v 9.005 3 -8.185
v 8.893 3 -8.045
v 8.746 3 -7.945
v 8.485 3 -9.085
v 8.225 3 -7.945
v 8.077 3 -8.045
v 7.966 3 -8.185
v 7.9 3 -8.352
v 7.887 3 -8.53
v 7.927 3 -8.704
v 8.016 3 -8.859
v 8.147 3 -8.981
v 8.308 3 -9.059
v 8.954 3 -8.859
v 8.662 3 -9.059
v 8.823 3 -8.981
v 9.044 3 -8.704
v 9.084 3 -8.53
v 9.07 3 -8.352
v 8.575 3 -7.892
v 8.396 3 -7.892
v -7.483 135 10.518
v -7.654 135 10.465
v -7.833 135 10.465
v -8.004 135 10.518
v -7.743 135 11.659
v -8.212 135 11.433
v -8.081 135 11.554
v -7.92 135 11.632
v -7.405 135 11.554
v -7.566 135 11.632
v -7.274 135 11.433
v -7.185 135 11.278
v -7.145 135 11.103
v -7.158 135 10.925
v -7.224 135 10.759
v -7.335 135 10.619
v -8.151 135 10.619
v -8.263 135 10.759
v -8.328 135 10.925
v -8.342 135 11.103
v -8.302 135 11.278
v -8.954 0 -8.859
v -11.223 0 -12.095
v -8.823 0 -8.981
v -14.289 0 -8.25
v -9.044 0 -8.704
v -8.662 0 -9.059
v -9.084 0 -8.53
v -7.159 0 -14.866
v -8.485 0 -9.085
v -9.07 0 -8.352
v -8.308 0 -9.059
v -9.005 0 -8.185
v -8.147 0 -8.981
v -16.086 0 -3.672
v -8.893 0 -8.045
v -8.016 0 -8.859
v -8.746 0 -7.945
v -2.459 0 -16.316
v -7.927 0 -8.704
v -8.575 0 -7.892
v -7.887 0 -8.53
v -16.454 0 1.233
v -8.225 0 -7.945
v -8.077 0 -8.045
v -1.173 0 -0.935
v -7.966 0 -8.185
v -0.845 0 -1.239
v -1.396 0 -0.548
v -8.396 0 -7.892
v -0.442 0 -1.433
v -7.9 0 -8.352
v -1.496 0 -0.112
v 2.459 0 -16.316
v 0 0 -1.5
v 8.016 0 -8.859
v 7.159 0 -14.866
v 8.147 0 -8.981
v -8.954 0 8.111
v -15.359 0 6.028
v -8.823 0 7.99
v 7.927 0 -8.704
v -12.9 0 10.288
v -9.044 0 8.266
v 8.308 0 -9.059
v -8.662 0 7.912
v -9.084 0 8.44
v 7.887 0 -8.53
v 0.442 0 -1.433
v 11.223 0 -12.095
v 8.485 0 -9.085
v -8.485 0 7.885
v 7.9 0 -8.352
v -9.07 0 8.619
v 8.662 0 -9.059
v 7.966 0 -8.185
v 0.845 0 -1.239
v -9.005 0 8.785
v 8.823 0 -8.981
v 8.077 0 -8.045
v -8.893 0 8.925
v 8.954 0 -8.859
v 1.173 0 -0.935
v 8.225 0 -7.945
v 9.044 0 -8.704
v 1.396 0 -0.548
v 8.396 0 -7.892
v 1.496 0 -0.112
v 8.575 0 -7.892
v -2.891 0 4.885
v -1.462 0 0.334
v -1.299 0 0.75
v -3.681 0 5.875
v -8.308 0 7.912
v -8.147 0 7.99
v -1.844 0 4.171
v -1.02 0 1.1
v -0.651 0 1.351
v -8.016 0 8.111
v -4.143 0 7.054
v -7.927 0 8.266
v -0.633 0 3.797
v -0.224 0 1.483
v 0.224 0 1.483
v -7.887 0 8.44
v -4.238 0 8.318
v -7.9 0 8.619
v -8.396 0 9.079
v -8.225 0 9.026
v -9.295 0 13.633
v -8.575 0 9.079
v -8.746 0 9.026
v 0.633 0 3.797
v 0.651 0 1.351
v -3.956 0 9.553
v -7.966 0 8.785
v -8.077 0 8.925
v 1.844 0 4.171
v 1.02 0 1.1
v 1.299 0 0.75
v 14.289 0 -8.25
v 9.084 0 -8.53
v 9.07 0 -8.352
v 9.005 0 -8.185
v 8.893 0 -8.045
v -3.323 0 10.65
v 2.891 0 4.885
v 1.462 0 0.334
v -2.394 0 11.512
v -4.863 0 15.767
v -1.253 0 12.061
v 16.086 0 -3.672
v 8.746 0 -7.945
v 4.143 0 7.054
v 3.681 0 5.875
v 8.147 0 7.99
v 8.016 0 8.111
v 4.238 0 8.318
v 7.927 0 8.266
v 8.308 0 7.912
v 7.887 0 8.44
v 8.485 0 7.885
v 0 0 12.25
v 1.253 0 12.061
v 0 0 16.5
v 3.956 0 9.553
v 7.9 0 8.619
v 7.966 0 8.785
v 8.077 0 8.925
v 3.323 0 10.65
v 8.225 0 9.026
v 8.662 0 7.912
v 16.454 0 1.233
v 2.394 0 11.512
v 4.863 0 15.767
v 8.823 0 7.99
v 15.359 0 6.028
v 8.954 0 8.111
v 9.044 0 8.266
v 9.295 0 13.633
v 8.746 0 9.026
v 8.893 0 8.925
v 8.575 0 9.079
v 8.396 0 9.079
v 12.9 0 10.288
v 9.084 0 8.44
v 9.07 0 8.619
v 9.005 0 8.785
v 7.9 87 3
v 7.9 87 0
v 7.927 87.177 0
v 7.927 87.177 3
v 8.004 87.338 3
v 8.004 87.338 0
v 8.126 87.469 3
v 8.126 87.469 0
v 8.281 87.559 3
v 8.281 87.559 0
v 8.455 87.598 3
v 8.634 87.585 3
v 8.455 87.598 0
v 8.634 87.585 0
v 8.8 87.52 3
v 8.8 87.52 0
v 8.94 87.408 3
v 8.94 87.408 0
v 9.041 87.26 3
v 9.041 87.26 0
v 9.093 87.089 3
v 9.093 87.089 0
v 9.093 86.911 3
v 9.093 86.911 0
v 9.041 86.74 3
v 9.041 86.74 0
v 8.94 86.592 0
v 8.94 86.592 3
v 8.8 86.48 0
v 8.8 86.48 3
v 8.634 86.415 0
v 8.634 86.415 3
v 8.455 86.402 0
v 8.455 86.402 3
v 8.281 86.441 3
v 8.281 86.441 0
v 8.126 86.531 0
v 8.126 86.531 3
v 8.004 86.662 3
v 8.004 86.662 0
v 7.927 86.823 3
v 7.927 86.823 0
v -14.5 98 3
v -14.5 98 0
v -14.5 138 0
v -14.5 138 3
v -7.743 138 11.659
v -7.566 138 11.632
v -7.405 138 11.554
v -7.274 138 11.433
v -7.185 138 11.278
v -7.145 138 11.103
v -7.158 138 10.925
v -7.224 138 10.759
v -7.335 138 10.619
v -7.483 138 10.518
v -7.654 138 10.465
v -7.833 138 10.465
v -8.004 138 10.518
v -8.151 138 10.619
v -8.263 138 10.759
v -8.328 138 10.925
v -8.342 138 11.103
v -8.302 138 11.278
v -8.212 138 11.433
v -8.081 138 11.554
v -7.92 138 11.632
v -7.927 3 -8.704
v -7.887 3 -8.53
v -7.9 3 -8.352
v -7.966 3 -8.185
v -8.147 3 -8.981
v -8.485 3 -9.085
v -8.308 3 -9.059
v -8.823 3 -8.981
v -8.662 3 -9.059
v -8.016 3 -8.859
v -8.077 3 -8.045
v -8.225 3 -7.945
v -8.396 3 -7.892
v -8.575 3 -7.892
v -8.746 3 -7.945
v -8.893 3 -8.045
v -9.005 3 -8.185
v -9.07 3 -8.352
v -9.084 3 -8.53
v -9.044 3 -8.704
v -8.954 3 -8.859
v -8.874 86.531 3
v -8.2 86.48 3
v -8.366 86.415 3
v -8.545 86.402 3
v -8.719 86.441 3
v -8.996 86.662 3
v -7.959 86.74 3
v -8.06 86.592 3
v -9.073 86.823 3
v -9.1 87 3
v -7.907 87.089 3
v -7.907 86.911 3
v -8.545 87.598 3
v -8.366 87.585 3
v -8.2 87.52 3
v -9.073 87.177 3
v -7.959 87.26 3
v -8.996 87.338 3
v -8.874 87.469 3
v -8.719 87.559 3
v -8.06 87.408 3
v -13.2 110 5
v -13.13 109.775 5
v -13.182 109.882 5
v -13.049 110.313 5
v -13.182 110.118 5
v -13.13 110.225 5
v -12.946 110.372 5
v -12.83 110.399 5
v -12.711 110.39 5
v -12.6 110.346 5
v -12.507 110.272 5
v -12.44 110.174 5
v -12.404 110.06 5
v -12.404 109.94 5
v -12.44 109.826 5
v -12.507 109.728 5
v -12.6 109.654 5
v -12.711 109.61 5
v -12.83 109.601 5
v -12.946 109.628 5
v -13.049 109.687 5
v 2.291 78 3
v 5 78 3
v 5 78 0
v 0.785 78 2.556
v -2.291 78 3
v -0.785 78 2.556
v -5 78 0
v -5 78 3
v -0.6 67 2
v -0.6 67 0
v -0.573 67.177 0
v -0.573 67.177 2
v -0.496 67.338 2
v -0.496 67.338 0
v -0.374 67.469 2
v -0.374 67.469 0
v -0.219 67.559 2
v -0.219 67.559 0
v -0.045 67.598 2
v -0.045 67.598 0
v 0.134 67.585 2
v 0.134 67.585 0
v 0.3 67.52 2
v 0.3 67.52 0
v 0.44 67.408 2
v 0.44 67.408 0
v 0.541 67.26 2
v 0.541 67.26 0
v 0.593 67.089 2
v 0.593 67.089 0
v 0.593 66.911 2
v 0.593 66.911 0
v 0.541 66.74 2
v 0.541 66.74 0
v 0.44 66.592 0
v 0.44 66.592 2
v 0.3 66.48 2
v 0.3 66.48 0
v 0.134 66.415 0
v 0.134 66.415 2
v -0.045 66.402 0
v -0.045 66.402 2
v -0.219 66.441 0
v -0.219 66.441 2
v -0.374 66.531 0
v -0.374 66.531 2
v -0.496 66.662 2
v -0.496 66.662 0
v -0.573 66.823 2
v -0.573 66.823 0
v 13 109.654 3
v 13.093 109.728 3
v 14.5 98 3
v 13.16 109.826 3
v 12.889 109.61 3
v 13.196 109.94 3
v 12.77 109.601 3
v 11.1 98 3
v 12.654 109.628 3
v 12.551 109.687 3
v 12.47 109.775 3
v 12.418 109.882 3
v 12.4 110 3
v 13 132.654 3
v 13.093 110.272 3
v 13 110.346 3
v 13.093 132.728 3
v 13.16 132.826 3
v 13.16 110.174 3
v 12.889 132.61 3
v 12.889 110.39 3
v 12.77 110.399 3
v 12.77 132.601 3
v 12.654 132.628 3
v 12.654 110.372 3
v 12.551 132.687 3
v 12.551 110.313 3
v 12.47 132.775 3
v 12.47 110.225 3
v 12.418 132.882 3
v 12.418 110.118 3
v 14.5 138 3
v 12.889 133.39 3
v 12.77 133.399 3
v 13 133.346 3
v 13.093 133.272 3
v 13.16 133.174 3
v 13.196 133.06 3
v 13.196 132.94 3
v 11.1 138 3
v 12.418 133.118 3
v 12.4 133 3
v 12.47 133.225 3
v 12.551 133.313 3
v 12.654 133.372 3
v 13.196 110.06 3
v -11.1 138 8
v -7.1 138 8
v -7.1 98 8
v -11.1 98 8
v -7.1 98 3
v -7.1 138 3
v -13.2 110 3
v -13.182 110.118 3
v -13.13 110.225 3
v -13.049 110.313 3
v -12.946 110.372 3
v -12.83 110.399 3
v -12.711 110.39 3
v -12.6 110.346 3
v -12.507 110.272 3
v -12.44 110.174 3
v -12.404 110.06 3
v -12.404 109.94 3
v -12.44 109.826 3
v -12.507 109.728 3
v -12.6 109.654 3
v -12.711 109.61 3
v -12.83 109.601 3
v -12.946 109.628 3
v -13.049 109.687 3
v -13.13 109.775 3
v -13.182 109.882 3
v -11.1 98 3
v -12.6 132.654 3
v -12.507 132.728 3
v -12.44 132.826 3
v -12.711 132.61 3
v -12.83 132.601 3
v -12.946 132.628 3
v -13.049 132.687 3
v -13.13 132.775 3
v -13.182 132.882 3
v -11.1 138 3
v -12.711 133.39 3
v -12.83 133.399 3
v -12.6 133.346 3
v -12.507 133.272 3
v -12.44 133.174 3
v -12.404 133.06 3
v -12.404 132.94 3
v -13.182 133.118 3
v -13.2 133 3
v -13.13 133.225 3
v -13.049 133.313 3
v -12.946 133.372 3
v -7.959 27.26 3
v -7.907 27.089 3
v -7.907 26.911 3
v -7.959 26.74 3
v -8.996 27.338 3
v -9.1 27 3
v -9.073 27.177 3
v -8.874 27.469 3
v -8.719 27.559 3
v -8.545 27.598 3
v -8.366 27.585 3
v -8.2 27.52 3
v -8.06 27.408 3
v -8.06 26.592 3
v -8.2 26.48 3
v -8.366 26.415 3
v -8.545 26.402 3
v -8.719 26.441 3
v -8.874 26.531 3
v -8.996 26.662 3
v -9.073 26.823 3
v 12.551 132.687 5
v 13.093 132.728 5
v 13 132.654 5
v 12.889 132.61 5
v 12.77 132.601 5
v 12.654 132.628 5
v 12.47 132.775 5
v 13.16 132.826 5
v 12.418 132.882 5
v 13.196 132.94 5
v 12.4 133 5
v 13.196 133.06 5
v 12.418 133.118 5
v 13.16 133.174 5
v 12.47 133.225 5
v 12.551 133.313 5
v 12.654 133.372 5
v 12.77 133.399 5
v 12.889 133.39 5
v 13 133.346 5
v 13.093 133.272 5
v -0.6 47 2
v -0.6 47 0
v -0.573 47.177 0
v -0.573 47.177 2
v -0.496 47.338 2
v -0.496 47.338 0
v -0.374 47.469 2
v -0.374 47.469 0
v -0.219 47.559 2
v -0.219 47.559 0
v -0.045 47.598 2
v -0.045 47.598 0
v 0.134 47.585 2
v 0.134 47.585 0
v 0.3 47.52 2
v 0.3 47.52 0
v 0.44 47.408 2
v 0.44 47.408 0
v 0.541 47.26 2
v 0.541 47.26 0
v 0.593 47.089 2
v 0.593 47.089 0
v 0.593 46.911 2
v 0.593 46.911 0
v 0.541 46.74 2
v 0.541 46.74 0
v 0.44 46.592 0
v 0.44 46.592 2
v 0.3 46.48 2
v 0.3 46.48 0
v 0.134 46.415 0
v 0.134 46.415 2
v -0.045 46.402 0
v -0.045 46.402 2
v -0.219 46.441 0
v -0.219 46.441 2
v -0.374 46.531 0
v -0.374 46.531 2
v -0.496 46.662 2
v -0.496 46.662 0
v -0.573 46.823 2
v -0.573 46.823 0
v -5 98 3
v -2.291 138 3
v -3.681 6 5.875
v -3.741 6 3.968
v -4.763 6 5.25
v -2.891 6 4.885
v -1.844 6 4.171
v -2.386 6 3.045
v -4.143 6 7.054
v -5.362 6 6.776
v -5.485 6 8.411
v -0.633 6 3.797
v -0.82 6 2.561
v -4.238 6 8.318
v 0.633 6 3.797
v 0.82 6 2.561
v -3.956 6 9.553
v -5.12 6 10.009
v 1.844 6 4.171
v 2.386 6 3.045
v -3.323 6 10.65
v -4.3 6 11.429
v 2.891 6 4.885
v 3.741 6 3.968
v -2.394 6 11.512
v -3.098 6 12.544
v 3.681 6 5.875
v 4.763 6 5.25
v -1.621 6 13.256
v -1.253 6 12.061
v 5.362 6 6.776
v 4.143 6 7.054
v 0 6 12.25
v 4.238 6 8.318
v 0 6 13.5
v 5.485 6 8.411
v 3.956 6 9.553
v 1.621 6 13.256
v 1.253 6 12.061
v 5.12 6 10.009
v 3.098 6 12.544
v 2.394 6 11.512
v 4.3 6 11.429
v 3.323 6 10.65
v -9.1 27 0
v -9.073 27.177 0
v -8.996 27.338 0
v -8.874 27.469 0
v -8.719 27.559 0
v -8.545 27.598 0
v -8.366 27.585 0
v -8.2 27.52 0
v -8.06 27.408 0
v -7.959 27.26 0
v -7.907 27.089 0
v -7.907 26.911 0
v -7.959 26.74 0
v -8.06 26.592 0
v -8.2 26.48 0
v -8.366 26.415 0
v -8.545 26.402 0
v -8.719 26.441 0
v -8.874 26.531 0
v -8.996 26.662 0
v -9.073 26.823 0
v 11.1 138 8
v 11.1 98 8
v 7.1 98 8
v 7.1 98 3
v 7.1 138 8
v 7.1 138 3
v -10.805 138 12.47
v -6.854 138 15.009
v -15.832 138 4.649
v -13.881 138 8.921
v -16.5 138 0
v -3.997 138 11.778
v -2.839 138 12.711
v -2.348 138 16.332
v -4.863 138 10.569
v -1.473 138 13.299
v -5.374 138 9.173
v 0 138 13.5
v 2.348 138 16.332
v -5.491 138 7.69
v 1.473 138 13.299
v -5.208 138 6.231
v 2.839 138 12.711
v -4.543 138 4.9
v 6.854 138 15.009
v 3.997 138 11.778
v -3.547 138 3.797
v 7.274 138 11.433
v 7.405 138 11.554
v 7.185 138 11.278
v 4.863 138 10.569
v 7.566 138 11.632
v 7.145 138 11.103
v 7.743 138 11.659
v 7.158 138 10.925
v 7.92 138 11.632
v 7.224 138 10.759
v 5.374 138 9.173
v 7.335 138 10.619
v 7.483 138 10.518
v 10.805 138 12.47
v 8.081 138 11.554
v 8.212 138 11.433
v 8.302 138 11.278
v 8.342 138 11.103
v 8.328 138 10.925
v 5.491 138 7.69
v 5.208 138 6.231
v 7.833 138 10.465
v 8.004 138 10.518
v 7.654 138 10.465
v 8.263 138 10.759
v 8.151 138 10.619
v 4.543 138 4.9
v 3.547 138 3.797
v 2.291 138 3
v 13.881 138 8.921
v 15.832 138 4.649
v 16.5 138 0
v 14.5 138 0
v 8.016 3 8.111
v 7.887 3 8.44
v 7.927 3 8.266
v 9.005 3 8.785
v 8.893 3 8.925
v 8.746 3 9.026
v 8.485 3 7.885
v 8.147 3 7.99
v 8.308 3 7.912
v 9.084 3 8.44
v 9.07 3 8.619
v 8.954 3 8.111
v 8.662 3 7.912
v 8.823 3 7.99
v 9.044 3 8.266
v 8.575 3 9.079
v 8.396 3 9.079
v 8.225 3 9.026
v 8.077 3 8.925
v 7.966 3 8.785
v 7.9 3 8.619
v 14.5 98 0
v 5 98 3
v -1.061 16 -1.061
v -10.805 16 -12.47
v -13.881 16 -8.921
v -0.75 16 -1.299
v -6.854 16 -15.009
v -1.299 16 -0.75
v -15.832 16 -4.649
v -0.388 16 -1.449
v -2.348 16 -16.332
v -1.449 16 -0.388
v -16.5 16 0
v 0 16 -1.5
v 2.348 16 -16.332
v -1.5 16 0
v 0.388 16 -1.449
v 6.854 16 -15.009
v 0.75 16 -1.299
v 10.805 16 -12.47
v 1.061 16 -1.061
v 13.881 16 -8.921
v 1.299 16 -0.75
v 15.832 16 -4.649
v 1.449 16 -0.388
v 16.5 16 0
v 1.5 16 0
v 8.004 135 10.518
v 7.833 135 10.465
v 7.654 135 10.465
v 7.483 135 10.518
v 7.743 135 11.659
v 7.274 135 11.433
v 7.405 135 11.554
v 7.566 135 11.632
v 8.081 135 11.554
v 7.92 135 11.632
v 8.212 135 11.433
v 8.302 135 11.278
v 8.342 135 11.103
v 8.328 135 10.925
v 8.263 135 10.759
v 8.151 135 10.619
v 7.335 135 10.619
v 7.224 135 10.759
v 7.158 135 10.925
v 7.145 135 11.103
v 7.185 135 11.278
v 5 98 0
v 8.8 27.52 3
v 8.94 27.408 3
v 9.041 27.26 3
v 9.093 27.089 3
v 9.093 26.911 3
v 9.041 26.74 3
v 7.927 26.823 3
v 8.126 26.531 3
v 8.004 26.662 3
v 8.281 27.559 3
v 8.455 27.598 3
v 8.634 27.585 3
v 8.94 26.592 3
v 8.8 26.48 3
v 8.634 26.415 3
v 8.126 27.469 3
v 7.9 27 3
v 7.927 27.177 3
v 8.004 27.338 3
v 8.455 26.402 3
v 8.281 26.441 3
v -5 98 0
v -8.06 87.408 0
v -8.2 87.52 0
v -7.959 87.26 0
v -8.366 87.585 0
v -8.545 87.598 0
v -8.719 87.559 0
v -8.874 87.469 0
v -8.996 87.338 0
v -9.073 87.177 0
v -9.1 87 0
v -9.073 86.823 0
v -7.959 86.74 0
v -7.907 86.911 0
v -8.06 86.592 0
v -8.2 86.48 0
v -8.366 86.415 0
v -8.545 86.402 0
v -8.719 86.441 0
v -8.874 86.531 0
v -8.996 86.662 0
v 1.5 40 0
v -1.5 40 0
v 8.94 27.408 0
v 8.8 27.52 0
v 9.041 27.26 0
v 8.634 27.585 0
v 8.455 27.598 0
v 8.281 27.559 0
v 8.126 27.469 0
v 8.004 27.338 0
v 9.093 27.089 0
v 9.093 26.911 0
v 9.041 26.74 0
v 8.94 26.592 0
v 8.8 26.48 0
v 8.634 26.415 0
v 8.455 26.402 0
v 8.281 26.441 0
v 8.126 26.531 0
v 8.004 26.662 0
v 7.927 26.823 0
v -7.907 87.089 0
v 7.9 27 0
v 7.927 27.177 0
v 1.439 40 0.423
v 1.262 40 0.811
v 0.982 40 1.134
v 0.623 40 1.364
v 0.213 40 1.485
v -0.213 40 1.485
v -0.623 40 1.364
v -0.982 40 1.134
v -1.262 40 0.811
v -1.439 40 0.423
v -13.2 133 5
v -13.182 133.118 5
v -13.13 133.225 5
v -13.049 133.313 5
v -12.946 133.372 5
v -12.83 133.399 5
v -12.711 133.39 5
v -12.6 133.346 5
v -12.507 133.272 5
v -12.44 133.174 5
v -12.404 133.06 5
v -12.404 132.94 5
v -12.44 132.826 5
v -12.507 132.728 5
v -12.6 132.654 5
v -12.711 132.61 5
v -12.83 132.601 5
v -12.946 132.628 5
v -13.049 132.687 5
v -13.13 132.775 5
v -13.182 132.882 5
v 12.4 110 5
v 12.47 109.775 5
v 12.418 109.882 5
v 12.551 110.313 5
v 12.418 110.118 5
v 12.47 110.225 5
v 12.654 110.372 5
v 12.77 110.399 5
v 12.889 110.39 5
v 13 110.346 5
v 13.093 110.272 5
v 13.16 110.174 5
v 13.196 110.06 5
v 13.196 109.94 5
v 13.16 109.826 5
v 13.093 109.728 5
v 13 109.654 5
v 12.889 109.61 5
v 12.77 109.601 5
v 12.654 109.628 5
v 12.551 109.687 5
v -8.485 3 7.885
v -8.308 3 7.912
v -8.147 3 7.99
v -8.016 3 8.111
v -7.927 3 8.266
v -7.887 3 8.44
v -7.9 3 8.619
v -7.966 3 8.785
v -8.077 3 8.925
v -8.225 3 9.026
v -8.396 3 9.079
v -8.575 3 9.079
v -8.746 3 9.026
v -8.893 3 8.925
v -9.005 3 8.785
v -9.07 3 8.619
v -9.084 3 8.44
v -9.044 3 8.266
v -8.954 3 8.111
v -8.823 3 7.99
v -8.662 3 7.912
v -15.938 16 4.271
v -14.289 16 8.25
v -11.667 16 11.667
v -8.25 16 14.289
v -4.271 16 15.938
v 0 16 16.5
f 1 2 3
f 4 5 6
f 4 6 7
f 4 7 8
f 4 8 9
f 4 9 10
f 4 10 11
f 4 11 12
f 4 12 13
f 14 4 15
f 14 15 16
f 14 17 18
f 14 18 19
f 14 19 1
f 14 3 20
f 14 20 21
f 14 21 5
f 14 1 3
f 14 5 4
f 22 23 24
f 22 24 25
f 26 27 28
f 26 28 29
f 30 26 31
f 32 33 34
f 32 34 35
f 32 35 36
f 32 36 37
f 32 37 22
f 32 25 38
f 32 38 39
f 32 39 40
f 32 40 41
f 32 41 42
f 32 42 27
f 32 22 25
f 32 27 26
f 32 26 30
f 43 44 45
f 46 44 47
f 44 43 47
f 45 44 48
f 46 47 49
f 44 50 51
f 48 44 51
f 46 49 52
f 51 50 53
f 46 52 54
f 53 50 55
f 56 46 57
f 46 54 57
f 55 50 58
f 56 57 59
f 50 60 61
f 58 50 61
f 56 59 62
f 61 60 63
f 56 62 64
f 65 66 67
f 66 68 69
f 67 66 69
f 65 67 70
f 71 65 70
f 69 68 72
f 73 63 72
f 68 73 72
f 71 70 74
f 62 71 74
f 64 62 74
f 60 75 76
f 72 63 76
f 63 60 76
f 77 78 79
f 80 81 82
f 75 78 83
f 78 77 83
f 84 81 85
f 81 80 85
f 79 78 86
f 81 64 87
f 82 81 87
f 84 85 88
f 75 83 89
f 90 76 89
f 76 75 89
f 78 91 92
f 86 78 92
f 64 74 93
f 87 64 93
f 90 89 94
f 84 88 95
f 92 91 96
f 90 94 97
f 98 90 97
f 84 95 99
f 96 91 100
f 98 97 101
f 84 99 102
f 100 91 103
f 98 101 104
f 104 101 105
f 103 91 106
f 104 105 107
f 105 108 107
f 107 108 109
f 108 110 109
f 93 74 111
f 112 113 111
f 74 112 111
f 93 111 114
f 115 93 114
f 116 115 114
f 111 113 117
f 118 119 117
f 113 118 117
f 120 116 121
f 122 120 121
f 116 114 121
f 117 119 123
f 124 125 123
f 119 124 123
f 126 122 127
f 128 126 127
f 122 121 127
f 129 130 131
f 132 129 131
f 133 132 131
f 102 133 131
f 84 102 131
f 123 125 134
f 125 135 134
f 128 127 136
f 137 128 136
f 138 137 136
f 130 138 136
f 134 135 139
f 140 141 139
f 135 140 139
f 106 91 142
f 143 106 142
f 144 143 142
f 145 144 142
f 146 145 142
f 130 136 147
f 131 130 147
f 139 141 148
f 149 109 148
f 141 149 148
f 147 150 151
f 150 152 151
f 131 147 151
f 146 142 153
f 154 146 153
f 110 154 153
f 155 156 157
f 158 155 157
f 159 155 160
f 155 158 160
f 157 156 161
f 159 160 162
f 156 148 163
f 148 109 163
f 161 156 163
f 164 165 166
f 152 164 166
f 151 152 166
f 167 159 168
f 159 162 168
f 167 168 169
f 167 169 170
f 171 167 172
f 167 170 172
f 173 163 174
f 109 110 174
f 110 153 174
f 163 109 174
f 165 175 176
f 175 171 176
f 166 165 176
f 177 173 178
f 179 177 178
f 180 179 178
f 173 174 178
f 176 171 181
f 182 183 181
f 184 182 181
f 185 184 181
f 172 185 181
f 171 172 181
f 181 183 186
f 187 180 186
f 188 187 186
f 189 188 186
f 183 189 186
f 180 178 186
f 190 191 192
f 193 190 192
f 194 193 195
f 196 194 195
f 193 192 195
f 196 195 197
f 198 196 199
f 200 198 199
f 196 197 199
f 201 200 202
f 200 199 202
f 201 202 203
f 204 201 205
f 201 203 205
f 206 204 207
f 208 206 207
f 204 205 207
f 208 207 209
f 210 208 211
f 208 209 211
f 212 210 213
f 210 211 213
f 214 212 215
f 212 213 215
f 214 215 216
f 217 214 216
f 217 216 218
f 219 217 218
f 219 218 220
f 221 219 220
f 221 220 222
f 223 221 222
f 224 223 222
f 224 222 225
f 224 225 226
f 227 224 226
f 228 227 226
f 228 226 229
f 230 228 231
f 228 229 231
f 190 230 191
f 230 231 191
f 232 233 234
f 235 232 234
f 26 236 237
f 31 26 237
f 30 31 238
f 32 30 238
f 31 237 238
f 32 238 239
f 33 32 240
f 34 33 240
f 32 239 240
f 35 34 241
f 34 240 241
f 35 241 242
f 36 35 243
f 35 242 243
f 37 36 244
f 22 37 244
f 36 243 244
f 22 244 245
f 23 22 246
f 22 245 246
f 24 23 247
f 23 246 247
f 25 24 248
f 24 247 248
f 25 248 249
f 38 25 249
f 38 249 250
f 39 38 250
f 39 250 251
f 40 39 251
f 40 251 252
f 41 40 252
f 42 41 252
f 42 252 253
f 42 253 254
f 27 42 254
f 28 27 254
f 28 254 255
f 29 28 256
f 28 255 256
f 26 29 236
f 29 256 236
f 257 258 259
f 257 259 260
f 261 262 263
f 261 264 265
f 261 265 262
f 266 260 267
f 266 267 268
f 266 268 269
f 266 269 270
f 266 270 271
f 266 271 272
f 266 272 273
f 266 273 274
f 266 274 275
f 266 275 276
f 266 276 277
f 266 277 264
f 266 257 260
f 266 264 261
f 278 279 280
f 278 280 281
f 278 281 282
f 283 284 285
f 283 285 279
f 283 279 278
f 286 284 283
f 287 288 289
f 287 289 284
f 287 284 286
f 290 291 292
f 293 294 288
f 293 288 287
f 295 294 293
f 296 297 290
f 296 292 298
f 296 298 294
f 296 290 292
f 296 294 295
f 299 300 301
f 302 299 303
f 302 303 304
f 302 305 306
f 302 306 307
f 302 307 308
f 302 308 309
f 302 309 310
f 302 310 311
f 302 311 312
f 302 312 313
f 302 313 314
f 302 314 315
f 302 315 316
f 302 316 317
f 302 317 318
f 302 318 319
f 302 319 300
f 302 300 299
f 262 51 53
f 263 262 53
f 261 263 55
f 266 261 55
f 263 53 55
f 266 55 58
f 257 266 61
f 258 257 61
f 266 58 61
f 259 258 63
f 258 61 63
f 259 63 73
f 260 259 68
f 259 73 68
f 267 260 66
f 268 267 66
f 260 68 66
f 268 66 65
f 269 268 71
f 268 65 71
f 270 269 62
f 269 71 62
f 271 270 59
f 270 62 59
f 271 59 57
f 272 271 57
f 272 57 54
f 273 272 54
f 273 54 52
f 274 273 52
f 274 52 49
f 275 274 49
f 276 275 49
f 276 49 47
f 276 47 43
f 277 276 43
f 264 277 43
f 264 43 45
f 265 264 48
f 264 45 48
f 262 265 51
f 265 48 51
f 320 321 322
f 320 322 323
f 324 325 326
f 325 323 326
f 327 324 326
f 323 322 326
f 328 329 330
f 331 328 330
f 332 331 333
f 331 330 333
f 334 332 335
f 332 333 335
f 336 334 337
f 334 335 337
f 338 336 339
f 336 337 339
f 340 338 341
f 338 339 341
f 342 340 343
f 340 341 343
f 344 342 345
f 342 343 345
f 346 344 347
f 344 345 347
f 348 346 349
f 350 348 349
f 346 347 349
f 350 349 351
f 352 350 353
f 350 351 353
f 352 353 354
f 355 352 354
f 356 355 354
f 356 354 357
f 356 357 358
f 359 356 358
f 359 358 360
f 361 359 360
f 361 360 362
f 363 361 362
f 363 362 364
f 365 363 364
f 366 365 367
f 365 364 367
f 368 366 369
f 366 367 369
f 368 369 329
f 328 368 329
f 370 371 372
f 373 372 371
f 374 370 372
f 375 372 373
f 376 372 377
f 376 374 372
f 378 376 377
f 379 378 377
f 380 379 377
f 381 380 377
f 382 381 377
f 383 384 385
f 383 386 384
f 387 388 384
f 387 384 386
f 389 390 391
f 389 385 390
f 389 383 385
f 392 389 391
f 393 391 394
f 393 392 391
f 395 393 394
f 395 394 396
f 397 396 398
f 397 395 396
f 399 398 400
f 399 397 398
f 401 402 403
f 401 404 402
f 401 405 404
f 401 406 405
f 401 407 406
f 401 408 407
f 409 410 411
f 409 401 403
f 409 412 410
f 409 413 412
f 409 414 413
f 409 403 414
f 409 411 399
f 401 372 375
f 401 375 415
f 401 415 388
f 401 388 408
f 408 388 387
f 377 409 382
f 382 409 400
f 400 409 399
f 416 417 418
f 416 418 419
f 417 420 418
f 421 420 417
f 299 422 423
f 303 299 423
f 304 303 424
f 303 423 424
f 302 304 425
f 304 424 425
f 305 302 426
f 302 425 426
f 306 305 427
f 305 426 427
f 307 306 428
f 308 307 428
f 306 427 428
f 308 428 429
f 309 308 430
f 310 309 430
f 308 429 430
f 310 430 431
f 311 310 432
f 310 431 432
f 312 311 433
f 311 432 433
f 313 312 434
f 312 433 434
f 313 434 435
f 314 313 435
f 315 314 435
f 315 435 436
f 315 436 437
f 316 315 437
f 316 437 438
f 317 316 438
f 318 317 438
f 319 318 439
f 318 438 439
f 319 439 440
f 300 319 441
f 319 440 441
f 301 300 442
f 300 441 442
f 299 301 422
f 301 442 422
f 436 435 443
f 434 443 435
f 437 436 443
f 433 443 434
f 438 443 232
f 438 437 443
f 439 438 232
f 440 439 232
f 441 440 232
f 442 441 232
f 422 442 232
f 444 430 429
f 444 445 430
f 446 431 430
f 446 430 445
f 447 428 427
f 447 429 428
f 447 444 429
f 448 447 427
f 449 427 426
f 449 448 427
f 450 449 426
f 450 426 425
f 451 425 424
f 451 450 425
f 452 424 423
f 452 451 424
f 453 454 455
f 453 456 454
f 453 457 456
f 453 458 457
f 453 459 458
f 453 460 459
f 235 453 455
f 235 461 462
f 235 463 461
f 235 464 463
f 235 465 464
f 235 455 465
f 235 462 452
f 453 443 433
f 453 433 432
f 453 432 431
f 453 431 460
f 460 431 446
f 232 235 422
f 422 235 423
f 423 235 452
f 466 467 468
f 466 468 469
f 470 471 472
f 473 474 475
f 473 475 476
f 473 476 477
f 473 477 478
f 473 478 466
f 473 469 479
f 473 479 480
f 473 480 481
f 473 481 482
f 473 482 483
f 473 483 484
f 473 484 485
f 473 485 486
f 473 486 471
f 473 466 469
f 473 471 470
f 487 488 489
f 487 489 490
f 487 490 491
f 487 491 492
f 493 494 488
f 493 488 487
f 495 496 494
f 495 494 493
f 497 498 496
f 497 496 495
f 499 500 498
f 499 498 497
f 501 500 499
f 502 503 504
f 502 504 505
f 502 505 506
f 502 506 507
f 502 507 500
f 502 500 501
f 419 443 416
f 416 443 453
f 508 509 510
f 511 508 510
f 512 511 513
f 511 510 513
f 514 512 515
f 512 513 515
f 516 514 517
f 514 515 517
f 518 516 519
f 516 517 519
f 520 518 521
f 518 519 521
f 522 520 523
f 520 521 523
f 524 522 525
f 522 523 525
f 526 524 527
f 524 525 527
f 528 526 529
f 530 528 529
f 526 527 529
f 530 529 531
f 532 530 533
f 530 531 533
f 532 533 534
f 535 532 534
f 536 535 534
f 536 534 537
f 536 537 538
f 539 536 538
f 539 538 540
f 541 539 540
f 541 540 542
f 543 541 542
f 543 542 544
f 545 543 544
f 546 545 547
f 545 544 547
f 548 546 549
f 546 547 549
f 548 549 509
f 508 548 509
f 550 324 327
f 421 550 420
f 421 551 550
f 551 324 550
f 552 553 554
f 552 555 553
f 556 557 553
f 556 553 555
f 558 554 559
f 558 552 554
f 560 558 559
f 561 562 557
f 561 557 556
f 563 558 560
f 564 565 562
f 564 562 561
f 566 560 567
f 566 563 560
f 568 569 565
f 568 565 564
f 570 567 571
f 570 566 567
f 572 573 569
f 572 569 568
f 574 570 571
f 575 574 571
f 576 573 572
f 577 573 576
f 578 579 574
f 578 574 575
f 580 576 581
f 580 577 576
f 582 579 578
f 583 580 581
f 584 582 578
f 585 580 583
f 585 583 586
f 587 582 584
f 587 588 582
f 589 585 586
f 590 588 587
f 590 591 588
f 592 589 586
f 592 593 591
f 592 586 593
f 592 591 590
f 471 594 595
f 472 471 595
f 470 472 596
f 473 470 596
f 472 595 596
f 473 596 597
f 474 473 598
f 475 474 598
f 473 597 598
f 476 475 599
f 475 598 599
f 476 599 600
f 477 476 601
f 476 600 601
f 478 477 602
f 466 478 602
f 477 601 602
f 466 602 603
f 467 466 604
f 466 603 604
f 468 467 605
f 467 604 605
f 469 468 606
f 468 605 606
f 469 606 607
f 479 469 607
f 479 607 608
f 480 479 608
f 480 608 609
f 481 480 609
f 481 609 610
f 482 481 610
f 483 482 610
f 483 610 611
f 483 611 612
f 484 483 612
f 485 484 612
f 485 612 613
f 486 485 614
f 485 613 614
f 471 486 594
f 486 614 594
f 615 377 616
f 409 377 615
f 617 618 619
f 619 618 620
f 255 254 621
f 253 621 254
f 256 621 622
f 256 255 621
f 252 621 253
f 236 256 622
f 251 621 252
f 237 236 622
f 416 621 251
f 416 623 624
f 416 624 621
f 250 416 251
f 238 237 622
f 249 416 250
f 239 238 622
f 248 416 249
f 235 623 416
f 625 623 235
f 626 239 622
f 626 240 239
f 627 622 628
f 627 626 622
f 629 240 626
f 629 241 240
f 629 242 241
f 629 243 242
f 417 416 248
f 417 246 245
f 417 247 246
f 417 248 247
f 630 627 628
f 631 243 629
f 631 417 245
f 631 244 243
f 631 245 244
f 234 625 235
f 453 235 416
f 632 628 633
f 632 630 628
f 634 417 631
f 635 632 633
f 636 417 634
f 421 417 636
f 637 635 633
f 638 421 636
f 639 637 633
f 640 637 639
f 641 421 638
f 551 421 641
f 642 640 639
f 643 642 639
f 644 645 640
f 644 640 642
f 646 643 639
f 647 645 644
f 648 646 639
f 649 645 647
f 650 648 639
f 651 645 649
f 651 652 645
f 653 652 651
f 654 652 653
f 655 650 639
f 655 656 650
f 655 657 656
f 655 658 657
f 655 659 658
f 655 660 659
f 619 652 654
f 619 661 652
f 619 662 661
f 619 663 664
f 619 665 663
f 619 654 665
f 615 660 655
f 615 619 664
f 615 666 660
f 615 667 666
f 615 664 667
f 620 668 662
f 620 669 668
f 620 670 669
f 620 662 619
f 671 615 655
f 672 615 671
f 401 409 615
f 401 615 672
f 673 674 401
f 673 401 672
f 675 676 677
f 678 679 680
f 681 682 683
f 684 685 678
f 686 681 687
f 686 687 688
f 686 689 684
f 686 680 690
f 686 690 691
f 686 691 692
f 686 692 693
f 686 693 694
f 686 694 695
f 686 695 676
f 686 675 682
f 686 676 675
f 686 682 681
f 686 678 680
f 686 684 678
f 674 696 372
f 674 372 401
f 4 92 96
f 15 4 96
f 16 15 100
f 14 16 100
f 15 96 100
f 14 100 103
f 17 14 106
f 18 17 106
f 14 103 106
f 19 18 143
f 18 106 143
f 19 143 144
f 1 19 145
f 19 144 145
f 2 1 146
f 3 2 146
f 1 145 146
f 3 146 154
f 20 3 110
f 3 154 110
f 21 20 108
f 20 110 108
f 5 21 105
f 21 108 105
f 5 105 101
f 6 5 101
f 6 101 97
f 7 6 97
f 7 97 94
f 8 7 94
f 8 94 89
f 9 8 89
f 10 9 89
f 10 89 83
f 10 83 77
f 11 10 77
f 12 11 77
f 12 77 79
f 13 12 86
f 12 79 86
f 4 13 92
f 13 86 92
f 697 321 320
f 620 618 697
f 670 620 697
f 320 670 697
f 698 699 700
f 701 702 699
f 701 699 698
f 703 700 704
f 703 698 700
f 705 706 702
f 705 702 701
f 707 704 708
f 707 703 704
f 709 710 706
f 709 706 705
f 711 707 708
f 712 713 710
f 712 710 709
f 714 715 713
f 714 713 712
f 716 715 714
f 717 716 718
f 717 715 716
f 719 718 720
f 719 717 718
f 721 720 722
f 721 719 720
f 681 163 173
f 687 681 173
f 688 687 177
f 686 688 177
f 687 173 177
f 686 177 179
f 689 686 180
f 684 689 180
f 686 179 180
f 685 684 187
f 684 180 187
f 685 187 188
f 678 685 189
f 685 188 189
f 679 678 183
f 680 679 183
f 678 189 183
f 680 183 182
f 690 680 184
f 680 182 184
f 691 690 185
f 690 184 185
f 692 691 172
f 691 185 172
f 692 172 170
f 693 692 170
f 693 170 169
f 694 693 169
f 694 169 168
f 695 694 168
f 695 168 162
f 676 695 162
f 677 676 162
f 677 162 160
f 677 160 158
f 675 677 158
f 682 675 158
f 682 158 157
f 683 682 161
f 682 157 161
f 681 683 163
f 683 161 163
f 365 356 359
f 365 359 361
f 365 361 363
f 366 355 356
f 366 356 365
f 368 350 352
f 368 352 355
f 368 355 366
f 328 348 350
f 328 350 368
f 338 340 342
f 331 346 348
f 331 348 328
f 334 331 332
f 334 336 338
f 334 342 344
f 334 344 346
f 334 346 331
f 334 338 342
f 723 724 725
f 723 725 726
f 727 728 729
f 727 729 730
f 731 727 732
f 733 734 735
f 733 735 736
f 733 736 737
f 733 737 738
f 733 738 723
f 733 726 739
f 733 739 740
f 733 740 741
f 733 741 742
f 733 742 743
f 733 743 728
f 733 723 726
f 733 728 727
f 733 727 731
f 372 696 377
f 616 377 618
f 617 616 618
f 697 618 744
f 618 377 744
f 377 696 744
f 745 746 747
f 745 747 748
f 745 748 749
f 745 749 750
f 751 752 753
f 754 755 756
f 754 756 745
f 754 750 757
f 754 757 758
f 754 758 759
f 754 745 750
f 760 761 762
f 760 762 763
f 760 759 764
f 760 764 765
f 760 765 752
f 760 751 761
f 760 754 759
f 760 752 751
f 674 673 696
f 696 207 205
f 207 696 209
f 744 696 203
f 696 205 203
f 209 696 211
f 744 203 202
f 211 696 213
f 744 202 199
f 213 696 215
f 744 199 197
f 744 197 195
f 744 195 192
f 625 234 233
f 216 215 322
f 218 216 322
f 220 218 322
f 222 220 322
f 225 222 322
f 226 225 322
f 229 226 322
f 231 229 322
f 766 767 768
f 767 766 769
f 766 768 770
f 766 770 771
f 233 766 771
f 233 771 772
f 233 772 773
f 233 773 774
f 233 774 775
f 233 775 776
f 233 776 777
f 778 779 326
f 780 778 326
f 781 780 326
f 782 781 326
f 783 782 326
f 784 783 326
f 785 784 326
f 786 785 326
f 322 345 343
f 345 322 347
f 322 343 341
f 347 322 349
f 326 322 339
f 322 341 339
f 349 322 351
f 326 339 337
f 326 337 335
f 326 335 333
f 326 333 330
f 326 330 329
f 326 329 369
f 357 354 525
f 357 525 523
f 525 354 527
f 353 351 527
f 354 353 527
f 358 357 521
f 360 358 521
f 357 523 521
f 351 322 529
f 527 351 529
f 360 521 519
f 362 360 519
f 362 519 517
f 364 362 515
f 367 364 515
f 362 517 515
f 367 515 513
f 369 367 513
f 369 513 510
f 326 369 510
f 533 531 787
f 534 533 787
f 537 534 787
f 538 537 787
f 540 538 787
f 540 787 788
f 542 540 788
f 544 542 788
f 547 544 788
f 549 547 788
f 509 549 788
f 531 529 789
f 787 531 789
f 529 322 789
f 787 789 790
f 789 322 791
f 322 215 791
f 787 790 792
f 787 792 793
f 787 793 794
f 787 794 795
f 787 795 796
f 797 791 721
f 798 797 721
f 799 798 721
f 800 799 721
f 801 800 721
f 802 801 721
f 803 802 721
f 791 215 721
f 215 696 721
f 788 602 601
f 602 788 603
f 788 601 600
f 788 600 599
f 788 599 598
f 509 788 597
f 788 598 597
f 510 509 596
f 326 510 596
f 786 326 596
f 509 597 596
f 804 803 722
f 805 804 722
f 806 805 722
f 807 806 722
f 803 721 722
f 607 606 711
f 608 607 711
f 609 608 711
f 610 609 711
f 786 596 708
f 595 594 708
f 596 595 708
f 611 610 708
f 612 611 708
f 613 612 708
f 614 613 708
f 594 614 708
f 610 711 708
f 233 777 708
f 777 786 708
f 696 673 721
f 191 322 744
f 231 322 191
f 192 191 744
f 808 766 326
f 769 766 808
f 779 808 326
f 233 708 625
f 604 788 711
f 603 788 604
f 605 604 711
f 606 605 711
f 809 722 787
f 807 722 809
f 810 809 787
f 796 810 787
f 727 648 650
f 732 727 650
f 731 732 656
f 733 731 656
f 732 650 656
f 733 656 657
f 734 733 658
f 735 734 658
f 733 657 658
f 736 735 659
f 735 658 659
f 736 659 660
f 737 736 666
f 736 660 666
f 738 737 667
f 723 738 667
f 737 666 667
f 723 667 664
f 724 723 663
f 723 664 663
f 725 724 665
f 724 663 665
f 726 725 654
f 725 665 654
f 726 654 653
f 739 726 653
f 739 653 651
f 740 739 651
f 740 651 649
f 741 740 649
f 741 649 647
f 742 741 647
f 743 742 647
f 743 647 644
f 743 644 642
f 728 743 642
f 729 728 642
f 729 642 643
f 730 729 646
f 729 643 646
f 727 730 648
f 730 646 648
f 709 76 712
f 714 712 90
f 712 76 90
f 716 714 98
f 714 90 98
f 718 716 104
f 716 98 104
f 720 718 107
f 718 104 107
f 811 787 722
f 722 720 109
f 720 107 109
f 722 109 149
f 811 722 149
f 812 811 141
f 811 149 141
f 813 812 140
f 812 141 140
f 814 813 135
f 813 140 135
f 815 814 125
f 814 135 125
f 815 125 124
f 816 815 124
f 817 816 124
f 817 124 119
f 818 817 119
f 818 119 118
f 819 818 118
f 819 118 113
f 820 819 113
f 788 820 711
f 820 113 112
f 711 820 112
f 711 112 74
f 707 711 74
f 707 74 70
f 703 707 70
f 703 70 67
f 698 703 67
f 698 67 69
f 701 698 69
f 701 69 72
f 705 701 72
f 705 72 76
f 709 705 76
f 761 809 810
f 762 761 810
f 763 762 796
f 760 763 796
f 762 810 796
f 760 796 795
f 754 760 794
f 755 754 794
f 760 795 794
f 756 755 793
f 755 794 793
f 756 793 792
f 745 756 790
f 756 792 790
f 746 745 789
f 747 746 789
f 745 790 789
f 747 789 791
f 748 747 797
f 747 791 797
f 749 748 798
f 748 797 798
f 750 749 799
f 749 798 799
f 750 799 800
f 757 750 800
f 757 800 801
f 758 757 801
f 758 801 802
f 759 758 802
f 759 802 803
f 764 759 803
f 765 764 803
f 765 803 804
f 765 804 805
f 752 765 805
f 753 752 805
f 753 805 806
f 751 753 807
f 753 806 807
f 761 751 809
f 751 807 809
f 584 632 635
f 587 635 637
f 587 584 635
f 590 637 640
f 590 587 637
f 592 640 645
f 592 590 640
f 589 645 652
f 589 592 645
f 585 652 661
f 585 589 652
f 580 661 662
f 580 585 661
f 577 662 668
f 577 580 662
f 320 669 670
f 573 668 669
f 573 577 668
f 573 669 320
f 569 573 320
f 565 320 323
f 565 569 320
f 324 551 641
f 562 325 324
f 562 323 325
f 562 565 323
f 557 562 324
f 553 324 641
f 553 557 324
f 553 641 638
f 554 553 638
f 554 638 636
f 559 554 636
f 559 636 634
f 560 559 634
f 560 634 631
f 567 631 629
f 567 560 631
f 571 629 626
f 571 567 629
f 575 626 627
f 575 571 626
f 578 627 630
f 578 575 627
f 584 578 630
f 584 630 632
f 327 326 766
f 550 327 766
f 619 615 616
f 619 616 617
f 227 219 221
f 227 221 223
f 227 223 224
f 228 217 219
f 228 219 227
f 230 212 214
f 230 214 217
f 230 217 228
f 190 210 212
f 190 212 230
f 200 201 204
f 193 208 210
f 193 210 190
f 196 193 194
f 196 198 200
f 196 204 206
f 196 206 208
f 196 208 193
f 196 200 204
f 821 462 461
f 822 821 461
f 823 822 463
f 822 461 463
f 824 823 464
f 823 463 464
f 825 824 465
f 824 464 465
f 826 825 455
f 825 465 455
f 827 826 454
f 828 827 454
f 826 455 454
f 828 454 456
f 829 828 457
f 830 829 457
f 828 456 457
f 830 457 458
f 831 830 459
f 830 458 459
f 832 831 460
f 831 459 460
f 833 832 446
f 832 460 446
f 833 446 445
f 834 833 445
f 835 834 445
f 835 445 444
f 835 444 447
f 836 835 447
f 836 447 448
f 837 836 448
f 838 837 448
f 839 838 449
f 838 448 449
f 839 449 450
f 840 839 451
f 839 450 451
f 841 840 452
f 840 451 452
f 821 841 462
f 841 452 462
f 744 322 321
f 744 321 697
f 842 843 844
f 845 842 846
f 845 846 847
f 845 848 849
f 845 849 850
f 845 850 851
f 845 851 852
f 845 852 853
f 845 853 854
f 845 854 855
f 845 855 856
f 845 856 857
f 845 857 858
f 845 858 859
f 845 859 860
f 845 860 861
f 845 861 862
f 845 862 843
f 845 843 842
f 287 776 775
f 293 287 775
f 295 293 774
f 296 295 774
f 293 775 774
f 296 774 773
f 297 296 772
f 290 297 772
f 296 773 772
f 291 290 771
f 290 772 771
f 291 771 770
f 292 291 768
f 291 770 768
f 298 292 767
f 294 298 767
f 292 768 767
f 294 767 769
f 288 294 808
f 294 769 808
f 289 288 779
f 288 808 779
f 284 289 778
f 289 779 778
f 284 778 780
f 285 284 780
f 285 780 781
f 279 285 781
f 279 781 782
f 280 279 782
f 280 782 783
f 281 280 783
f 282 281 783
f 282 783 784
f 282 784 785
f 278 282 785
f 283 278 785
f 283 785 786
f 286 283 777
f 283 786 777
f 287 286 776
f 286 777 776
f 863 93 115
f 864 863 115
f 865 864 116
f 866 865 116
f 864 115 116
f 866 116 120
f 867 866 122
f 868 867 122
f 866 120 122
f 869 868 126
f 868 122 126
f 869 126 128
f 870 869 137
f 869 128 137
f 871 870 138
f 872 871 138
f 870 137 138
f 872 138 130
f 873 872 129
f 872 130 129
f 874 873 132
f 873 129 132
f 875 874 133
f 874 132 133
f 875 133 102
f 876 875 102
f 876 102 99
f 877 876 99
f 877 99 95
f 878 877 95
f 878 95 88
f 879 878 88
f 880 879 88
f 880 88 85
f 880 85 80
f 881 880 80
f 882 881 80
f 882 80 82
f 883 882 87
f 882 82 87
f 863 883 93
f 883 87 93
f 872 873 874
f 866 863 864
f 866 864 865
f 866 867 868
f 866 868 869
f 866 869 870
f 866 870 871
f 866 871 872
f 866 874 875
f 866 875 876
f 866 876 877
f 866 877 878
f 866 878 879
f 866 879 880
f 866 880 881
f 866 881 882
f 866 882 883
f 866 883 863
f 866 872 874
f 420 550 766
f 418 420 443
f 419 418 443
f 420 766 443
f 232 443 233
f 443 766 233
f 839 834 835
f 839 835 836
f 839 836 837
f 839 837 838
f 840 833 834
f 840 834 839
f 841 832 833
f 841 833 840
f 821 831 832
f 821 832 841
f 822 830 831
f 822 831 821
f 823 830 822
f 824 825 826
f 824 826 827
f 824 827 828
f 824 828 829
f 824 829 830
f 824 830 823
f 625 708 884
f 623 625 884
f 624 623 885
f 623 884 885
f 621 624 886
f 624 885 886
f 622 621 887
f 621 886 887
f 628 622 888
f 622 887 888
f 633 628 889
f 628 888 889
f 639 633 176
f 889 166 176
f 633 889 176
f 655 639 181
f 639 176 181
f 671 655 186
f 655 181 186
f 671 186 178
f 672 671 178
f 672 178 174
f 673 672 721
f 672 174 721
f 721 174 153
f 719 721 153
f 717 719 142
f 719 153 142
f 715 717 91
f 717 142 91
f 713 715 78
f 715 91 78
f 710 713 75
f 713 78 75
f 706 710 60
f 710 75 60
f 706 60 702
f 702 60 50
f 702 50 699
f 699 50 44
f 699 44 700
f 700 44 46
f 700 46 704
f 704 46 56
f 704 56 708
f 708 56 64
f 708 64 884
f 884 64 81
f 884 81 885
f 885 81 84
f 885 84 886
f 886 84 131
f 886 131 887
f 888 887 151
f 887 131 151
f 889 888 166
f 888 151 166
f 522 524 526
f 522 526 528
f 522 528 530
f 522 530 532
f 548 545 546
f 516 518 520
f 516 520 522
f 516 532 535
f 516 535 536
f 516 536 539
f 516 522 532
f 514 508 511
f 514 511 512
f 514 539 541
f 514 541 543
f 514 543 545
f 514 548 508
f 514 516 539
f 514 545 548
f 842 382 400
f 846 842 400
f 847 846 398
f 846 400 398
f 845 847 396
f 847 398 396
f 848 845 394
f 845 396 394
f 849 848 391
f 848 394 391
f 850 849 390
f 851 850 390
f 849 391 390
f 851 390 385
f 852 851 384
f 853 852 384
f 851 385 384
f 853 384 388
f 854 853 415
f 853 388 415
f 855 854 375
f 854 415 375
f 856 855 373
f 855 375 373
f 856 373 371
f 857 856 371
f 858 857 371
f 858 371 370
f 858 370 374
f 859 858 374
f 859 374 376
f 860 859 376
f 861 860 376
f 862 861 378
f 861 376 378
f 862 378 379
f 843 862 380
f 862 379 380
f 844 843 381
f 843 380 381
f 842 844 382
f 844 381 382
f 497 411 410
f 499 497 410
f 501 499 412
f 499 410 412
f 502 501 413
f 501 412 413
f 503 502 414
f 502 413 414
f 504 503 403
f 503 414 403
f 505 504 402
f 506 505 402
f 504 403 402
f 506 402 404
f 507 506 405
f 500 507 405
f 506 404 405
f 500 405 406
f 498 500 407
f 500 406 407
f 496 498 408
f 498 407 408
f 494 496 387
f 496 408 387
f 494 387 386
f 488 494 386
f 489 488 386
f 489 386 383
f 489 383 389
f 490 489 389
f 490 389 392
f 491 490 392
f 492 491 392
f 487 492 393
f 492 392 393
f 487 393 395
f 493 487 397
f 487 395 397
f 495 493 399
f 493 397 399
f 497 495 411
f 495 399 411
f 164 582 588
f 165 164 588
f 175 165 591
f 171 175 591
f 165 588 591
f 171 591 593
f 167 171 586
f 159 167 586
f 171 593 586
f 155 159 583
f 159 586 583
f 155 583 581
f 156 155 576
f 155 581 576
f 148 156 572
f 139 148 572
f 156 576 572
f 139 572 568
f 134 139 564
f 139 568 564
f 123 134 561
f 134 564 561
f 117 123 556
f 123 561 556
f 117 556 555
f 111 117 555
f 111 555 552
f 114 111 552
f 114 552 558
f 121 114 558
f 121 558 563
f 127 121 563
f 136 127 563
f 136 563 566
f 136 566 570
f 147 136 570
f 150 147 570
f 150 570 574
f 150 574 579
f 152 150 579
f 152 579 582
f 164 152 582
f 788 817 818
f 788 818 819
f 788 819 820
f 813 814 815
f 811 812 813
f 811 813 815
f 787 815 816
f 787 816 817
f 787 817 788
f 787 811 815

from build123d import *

# Parameters (mm, degrees)
SKETCH_1_R          = 16.5
EXTRUDE_1_DEPTH     = 6
SKETCH_2_R          = 4.25
CUT_EXTRUDE_1_DEPTH = 25.093567606
SKETCH_3_R          = 0.6
CUT_EXTRUDE_2_DEPTH = 3
SKETCH_4_R          = 16.5
SKETCH_4_R_2        = 5.5
EXTRUDE_2_DEPTH     = 10
SKETCH_5_R          = 5.5
EXTRUDE_3_DEPTH     = 122
SKETCH_6_W          = 29
SKETCH_6_H          = 40
SKETCH_6_W_2        = 10
SKETCH_6_H_2        = 20
CUT_EXTRUDE_3_DEPTH = 3
SKETCH_7_W          = 4
SKETCH_7_H          = 40
CUT_EXTRUDE_4_DEPTH = 5
SKETCH_8_R          = 0.4
CUT_EXTRUDE_5_DEPTH = 2
SKETCH_9_R          = 0.6
CUT_EXTRUDE_6_DEPTH = 2
SKETCH_10_R         = 0.6
CUT_EXTRUDE_7_DEPTH = 3
SKETCH_11_R         = 0.6
CUT_EXTRUDE_8_DEPTH = 3
SKETCH_12_R         = 1.5
CUT_EXTRUDE_9_DEPTH = 40


with BuildPart() as part:
    # 草图1 → 凸台-拉伸1 (new body)
    with BuildSketch(Plane(origin=(0, 0, 0), x_dir=(1, 0, 0), z_dir=(0, 1, 0))):
        with Locations(Location((0, 0, 0), (0, 0, 270))):
            Circle(SKETCH_1_R)
    extrude(amount=EXTRUDE_1_DEPTH)

    # 草图2 → 切除-拉伸1 (cut, through all)
    with BuildSketch(Plane(origin=(0, 6, 0), x_dir=(1, 0, 0), z_dir=(0, 1, 0))):
        with Locations(Location((0, -8, 0), (0, 0, 270))):
            Circle(SKETCH_2_R)
    extrude(amount=-CUT_EXTRUDE_1_DEPTH, mode=Mode.SUBTRACT)

    # 草图3 → 切除-拉伸2 (cut)
    with BuildSketch(Plane.XZ):
        with Locations(Location((-8.485281374, 8.485281374, 0), (0, 0, 270))):
            Circle(SKETCH_3_R)
        with Locations(Location((8.485281374, 8.485281374, 0), (0, 0, 270))):
            Circle(SKETCH_3_R)
        with Locations(Location((8.485281374, -8.485281374, 0), (0, 0, 270))):
            Circle(SKETCH_3_R)
        with Locations(Location((-8.485281374, -8.485281374, 0), (0, 0, 270))):
            Circle(SKETCH_3_R)
    extrude(amount=-CUT_EXTRUDE_2_DEPTH, mode=Mode.SUBTRACT)

    # 草图4 → 凸台-拉伸2 (add)
    with BuildSketch(Plane(origin=(0, 6, 0), x_dir=(1, 0, 0), z_dir=(0, 1, 0))):
        with Locations(Location((0, 0, 0), (0, 0, 270))):
            Circle(SKETCH_4_R)
        with Locations(Location((0, -8, 0), (0, 0, 270))):
            Circle(SKETCH_4_R_2, mode=Mode.SUBTRACT)
    extrude(amount=EXTRUDE_2_DEPTH)

    # 草图5 → 凸台-拉伸3 (add)
    with BuildSketch(Plane(origin=(0, 16, 0), x_dir=(1, 0, 0), z_dir=(0, 1, 0))):
        with BuildLine():
            ThreePointArc((-16.5, 0), (0, -16.5), (16.5, 0))
            Line((16.5, 0), (-16.5, 0))
        make_face()
        with Locations(Location((0, -8, 0), (0, 0, 270))):
            Circle(SKETCH_5_R, mode=Mode.SUBTRACT)
    extrude(amount=EXTRUDE_3_DEPTH)

    # 草图6 → 切除-拉伸3 (cut)
    with BuildSketch(Plane(origin=(0, 0, 0), x_dir=(-1, 0, 0), z_dir=(0, 0, -1))):
        with Locations((0, 118)):
            Rectangle(SKETCH_6_W, SKETCH_6_H)
        with Locations((0, 88)):
            Rectangle(SKETCH_6_W_2, SKETCH_6_H_2)
    extrude(amount=-CUT_EXTRUDE_3_DEPTH, mode=Mode.SUBTRACT)

    # 草图7 → 切除-拉伸4 (cut)
    with BuildSketch(Plane(origin=(0, 0, 3), x_dir=(-1, 0, 0), z_dir=(0, 0, -1))):
        with Locations((9.1, 118)):
            Rectangle(SKETCH_7_W, SKETCH_7_H)
        with Locations((-9.1, 118)):
            Rectangle(SKETCH_7_W, SKETCH_7_H)
    extrude(amount=-CUT_EXTRUDE_4_DEPTH, mode=Mode.SUBTRACT)

    # 草图8 → 切除-拉伸5 (cut)
    with BuildSketch(Plane(origin=(0, 0, 3), x_dir=(-1, 0, 0), z_dir=(0, 0, -1))):
        with Locations((-12.8, 133)):
            Circle(SKETCH_8_R)
        with Locations((-12.8, 110)):
            Circle(SKETCH_8_R)
        with Locations((12.8, 133)):
            Circle(SKETCH_8_R)
        with Locations((12.8, 110)):
            Circle(SKETCH_8_R)
    extrude(amount=-CUT_EXTRUDE_5_DEPTH, mode=Mode.SUBTRACT)

    # 草图9 → 切除-拉伸6 (cut)
    with BuildSketch(Plane(origin=(0, 0, 0), x_dir=(-1, 0, 0), z_dir=(0, 0, -1))):
        with Locations((0, 67)):
            Circle(SKETCH_9_R)
        with Locations((0, 47)):
            Circle(SKETCH_9_R)
    extrude(amount=-CUT_EXTRUDE_6_DEPTH, mode=Mode.SUBTRACT)

    # 草图10 → 切除-拉伸7 (cut)
    with BuildSketch(Plane(origin=(0, 0, 0), x_dir=(-1, 0, 0), z_dir=(0, 0, -1))):
        with Locations((-8.5, 87)):
            Circle(SKETCH_10_R)
        with Locations((8.5, 87)):
            Circle(SKETCH_10_R)
        with Locations((8.5, 27)):
            Circle(SKETCH_10_R)
        with Locations((-8.5, 27)):
            Circle(SKETCH_10_R)
    extrude(amount=-CUT_EXTRUDE_7_DEPTH, mode=Mode.SUBTRACT)

    # 草图11 → 切除-拉伸8 (cut)
    with BuildSketch(Plane(origin=(0, 138, 0), x_dir=(1, 0, 0), z_dir=(0, 1, 0))):
        with Locations(Location((7.743281891, -11.058552598, 0), (0, 0, 270))):
            Circle(SKETCH_11_R)
        with Locations(Location((-7.743281891, -11.058552598, 0), (0, 0, 270))):
            Circle(SKETCH_11_R)
    extrude(amount=-CUT_EXTRUDE_8_DEPTH, mode=Mode.SUBTRACT)

    # 草图12 → 切除-拉伸9 (cut)
    with BuildSketch(Plane(origin=(0, 0, 0), x_dir=(-1, 0, 0), z_dir=(0, -1, 0))):
        with Locations(Location((0, 0, 0), (0, 0, 90))):
            Circle(SKETCH_12_R)
    extrude(amount=-CUT_EXTRUDE_9_DEPTH, mode=Mode.SUBTRACT)


solid = part.part
